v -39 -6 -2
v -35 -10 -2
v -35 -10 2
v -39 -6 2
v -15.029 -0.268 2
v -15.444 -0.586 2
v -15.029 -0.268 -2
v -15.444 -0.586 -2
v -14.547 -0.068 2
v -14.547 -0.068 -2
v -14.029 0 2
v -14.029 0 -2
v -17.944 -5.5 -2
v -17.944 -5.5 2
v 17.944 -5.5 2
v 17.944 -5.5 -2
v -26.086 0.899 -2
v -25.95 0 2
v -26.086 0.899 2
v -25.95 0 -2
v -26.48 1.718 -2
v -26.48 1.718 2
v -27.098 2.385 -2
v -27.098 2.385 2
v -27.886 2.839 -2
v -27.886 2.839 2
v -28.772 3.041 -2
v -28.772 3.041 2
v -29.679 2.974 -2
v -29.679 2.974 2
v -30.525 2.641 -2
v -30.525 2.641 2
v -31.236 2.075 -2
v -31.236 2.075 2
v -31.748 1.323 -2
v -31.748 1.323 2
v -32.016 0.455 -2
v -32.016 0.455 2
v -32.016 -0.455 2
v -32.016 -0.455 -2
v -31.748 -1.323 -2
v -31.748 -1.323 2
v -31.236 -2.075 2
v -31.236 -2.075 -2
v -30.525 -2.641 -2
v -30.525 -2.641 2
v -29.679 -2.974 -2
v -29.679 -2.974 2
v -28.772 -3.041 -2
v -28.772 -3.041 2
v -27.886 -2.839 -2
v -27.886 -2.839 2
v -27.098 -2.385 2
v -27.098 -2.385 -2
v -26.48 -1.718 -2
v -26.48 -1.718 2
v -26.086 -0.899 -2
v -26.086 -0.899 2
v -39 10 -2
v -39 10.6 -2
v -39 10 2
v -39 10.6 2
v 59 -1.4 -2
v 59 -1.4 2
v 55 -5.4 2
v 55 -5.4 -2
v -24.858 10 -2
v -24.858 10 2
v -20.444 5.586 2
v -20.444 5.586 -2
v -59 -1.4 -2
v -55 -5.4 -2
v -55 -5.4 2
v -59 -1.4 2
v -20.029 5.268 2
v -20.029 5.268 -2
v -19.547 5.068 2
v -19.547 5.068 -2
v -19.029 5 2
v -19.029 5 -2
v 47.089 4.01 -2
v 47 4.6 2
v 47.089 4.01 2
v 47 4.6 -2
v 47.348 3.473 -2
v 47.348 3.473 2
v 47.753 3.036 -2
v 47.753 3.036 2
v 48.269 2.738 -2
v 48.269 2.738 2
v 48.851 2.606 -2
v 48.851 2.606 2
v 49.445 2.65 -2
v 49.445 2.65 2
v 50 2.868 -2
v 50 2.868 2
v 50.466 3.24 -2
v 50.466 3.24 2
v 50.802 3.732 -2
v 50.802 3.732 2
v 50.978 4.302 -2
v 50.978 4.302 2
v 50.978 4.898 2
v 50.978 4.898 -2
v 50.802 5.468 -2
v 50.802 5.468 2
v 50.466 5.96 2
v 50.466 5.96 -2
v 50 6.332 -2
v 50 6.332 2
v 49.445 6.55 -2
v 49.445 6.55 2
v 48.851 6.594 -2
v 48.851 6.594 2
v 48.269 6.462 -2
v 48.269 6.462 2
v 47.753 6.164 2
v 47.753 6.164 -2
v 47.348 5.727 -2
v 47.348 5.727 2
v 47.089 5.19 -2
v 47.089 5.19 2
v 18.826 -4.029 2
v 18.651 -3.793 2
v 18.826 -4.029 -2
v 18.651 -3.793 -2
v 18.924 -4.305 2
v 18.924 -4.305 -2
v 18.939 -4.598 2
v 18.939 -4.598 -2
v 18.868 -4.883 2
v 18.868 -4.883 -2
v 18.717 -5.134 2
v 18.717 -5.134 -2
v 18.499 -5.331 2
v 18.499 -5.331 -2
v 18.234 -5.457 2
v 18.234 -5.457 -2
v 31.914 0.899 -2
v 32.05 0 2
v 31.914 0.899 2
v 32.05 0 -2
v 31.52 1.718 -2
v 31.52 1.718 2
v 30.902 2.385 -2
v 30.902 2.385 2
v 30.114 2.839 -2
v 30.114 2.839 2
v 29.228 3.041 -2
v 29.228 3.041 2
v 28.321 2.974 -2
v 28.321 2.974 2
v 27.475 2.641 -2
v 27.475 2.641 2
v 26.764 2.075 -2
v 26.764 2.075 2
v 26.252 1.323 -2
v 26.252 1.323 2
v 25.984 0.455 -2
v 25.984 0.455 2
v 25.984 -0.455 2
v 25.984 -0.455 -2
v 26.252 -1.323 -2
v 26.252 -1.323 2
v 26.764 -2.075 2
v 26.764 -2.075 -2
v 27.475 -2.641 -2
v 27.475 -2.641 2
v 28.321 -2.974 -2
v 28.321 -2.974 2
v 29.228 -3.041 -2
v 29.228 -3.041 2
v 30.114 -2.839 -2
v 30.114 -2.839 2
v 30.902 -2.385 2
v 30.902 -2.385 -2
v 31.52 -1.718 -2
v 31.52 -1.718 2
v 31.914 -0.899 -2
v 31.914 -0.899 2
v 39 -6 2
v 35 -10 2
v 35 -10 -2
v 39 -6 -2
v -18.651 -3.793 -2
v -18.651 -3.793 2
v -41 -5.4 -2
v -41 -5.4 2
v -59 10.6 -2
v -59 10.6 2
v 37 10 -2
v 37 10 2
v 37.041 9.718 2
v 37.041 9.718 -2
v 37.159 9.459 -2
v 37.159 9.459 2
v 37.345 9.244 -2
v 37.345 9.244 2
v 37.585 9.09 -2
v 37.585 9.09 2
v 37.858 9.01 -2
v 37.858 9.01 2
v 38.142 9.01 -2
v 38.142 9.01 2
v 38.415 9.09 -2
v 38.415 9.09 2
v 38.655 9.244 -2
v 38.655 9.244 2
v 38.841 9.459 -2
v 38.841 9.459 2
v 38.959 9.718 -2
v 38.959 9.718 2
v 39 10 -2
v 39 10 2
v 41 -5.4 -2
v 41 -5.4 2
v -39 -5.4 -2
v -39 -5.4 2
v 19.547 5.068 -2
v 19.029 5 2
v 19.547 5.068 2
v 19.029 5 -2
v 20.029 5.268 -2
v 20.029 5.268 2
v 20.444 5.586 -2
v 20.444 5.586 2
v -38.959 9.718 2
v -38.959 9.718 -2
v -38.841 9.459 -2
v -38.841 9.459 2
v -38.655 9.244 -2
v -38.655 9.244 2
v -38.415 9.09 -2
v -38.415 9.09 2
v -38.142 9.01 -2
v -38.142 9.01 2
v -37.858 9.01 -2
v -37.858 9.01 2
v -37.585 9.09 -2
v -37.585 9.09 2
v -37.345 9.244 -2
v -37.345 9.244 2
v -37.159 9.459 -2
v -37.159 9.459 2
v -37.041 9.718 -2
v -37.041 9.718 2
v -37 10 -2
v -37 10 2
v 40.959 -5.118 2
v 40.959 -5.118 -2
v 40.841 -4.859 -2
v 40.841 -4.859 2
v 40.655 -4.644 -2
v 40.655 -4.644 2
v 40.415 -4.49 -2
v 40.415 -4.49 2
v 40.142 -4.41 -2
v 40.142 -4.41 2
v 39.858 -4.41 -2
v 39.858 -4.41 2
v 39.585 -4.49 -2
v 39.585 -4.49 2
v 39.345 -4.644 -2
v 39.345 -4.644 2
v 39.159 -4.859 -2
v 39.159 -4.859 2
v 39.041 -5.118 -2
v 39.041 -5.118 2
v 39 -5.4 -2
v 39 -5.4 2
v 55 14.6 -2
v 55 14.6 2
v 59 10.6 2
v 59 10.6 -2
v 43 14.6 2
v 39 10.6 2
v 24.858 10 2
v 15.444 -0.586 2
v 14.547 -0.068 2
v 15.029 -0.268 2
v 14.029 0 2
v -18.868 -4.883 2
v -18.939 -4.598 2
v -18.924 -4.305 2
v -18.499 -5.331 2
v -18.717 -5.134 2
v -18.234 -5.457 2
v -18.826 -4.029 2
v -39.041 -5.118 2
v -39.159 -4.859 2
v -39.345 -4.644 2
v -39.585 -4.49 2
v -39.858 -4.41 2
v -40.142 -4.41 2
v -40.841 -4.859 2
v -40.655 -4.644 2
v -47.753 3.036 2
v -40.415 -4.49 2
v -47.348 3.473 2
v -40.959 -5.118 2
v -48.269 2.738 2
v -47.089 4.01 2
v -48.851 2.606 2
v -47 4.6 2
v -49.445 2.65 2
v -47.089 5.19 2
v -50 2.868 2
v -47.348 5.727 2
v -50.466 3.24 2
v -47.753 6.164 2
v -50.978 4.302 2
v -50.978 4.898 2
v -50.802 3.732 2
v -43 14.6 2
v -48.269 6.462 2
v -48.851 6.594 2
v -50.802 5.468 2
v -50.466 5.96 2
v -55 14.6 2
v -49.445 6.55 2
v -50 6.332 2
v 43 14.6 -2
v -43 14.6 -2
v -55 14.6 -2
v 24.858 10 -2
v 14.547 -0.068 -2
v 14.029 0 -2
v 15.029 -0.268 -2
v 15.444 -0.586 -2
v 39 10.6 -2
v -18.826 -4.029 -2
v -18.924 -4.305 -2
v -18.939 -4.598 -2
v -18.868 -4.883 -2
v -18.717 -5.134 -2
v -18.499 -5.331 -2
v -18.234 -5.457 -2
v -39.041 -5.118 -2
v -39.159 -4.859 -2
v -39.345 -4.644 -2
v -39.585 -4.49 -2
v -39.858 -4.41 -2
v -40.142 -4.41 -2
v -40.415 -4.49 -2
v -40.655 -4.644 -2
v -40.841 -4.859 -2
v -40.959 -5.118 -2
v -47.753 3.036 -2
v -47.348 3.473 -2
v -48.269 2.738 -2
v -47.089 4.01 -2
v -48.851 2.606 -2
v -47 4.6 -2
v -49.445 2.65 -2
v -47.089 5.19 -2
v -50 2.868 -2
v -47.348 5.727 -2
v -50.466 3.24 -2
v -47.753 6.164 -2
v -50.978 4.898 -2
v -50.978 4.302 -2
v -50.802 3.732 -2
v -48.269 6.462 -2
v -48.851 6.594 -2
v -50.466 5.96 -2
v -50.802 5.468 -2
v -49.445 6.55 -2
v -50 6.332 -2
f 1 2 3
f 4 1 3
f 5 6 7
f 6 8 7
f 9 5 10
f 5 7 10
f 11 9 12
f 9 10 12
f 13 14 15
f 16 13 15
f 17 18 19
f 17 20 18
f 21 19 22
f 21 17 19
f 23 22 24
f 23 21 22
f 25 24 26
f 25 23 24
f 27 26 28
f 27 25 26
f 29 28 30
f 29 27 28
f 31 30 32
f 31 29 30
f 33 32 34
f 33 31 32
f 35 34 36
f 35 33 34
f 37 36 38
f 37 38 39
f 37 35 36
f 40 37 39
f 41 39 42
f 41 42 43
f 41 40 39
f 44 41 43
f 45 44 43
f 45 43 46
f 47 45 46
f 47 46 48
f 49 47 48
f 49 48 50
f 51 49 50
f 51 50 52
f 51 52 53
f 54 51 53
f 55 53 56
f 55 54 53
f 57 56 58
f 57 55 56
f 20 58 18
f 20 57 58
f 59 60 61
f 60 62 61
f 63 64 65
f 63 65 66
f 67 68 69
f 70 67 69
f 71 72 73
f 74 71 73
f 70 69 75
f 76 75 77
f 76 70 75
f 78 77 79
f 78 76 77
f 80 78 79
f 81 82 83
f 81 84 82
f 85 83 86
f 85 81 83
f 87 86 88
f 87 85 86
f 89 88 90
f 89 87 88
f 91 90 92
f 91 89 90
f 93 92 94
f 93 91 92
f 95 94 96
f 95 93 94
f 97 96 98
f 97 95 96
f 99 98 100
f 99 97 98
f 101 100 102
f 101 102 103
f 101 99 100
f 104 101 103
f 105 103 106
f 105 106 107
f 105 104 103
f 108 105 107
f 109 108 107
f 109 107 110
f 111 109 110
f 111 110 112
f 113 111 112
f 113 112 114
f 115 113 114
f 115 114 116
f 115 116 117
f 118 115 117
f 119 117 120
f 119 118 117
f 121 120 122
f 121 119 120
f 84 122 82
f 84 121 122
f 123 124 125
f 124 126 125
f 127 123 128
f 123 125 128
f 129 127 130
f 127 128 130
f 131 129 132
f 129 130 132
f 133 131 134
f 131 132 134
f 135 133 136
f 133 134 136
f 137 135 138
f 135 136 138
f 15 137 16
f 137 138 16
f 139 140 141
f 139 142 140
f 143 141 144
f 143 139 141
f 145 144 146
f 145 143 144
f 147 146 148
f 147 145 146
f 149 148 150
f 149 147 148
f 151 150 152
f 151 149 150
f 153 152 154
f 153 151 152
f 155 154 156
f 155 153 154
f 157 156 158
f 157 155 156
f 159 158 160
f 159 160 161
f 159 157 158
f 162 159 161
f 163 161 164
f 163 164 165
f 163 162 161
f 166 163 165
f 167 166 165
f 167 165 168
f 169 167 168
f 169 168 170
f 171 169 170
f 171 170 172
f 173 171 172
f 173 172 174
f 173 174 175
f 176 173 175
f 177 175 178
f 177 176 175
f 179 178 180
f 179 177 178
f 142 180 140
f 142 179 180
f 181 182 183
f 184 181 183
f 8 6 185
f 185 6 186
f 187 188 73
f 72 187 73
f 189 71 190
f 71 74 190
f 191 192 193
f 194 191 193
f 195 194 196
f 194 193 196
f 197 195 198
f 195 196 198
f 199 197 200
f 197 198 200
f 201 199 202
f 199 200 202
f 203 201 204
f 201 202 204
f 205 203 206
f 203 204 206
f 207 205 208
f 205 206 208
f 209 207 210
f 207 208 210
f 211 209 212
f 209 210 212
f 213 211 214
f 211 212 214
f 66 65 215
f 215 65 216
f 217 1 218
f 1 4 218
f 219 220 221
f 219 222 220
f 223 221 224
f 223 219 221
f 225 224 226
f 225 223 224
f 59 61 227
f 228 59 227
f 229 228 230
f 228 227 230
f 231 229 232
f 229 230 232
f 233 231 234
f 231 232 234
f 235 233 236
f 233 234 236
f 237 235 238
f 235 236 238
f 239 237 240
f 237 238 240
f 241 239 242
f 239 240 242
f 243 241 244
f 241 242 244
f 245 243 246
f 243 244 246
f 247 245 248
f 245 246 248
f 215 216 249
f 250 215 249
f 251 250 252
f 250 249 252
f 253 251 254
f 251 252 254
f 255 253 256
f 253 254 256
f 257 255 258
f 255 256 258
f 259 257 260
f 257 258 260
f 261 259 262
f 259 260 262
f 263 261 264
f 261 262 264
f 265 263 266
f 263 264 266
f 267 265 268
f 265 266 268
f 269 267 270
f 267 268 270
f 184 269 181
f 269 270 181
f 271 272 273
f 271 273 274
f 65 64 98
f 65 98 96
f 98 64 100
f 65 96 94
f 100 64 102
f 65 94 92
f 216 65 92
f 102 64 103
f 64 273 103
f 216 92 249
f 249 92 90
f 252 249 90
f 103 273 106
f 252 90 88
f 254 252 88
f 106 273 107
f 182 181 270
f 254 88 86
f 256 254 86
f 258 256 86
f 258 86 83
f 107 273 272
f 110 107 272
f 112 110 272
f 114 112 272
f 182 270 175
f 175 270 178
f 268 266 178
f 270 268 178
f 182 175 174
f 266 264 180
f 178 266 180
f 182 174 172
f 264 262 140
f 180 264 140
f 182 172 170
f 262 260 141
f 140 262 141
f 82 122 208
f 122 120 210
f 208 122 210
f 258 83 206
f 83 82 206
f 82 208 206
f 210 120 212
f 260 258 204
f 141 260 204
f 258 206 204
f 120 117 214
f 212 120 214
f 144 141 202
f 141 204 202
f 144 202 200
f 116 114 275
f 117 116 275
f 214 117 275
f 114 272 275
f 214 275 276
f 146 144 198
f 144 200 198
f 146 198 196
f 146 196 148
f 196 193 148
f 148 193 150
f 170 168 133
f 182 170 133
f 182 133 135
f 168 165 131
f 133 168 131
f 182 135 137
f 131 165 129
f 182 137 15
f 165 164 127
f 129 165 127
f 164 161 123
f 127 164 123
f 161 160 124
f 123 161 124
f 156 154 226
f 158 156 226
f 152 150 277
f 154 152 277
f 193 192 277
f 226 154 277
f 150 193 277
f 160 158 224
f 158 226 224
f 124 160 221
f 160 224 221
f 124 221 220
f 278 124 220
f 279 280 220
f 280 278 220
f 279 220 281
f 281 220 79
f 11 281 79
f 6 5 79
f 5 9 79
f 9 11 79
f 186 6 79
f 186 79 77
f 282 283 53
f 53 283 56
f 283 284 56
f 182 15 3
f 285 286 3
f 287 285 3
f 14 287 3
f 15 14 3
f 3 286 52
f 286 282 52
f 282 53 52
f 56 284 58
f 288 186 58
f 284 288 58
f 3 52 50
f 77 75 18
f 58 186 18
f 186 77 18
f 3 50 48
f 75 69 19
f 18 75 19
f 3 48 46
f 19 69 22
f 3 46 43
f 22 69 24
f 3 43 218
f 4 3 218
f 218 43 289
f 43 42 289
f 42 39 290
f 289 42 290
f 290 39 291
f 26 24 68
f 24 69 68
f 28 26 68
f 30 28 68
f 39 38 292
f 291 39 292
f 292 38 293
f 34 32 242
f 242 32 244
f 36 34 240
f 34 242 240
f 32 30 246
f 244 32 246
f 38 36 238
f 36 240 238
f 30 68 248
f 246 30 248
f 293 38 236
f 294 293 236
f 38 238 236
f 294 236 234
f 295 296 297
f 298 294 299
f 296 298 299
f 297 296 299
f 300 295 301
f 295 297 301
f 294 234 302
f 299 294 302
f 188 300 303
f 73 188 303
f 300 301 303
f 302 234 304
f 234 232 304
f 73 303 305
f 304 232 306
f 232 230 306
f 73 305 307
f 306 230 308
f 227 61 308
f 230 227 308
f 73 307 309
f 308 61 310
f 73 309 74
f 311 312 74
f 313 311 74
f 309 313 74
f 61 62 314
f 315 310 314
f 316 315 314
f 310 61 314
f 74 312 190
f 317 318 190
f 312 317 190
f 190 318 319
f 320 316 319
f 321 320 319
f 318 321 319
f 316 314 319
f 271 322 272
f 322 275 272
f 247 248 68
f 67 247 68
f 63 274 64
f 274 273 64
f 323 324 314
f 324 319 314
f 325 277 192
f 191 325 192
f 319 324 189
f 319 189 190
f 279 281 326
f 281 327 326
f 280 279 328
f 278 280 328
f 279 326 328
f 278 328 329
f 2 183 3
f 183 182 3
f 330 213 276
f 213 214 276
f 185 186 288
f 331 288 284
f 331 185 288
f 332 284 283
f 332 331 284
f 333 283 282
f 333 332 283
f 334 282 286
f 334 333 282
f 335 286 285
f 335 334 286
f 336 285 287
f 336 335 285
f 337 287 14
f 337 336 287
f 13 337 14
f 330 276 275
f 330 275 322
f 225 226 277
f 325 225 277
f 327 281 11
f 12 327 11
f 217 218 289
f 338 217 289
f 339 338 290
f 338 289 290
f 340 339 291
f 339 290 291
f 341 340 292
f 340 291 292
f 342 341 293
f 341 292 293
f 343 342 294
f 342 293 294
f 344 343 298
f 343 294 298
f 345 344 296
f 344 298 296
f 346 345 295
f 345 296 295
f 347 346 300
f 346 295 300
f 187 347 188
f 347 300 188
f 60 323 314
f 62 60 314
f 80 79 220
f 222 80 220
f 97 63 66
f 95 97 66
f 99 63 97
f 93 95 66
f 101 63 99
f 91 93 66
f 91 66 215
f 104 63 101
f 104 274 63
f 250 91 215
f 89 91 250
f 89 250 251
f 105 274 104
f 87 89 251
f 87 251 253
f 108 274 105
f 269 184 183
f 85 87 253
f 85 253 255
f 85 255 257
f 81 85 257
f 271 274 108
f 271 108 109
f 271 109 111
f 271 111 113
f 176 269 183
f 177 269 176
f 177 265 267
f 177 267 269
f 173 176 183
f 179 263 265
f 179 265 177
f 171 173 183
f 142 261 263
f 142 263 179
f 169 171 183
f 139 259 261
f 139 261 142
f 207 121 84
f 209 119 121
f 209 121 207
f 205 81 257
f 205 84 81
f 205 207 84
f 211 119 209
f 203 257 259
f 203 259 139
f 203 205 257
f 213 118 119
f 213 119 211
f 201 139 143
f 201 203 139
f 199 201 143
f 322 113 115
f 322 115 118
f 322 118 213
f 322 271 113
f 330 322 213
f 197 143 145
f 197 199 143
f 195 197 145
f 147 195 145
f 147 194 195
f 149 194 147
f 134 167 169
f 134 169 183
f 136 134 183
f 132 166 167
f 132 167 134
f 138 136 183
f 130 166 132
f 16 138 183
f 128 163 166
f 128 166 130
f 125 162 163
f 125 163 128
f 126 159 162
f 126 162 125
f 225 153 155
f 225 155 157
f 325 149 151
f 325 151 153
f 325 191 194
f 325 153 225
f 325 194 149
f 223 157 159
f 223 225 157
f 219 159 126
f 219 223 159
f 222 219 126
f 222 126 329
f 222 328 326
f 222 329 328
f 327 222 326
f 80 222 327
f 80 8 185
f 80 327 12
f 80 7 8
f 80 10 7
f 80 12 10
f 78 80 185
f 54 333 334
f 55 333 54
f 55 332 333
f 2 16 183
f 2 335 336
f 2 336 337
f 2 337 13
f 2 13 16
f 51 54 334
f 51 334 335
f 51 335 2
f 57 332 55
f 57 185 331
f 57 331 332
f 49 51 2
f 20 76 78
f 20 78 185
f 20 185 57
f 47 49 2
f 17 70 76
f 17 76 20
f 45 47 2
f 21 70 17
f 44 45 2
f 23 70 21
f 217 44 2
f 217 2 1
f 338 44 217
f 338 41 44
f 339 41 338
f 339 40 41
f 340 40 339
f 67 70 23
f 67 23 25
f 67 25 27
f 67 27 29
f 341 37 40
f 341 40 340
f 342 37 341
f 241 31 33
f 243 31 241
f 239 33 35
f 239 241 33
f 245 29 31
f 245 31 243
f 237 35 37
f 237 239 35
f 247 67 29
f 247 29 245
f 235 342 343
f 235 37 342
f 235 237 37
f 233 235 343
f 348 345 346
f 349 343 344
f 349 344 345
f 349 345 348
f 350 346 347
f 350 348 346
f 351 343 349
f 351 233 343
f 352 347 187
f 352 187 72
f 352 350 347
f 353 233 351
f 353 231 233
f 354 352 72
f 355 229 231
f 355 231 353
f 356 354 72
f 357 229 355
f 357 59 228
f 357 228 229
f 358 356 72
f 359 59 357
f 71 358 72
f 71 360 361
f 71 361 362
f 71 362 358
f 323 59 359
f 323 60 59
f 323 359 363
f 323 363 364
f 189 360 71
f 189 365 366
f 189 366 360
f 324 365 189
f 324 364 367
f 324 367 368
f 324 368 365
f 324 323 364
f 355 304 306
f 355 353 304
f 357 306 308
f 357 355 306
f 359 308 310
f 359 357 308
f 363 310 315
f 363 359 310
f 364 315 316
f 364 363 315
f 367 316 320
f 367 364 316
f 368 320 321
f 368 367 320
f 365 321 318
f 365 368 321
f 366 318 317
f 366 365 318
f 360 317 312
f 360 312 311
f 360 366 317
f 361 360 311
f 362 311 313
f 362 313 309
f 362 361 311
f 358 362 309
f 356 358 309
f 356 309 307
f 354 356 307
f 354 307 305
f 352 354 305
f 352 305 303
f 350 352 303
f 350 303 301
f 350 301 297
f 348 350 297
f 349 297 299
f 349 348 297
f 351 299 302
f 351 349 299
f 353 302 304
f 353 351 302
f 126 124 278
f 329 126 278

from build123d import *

# Parameters (mm, degrees)
SKETCH_1_R          = 3.05
SKETCH_1_R_2        = 2
EXTRUDE_1_DEPTH     = 2
SKETCH_2_R          = 1
CUT_EXTRUDE_1_DEPTH = 61.911082735
CHAMFER_1_SIZE      = 4
CUT_EXTRUDE_2_DEPTH = 61.911082735
FILLET_1_R          = 1
FILLET_2_R          = 2


with BuildPart() as part:
    # 草图1 → 凸台-拉伸1 (new, symmetric)
    with BuildSketch(Plane.XY):
        Polygon((-39, 10), (39, 10), (39, 14.6), (59, 14.6), (59, -5.4), (39, -5.4), (39, -10), (-39, -10), (-39, -5.4), (-59, -5.4), (-59, 14.6), (-39, 14.6), align=None)
        with Locations((-29, 0)):
            Circle(SKETCH_1_R, mode=Mode.SUBTRACT)
        with Locations((29, 0)):
            Circle(SKETCH_1_R, mode=Mode.SUBTRACT)
        with Locations((-49, 4.6)):
            Circle(SKETCH_1_R_2, mode=Mode.SUBTRACT)
        with Locations(Location((49, 4.6, 0), (0, 0, 180))):
            Circle(SKETCH_1_R_2, mode=Mode.SUBTRACT)
    extrude(amount=EXTRUDE_1_DEPTH, both=True)

    # 草图2 → 切除-拉伸1 (cut, through all)
    with BuildSketch(Plane.XY.offset(2)):
        with Locations((-38, 10)):
            Circle(SKETCH_2_R)
        with Locations((-40, -5.4)):
            Circle(SKETCH_2_R)
        with Locations((38, 10)):
            Circle(SKETCH_2_R)
        with Locations((40, -5.4)):
            Circle(SKETCH_2_R)
        Polygon((-24.857864376, 10), (-19.857864376, 5), (19.857864376, 5), (24.857864376, 10), align=None)
    extrude(amount=-CUT_EXTRUDE_1_DEPTH, mode=Mode.SUBTRACT)

    # 倒角1
    chamfer_1_edges = [part.edges().sort_by_distance(p)[0] for p in [
        (39, 14.6, 0),
        (59, 14.6, 0),
        (59, -5.4, 0),
        (39, -10, 0),
        (-39, -10, 0),
        (-59, -5.4, 0),
        (-59, 14.6, 0),
        (-39, 14.6, 0),
    ]]
    chamfer(chamfer_1_edges, length=CHAMFER_1_SIZE)

    # 草图3 → 切除-拉伸2 (cut, through all)
    with BuildSketch(Plane.XY.offset(2)):
        Polygon((-14.857864376, 0), (-20.357864376, -5.5), (20.357864376, -5.5), (14.857864376, 0), align=None)
    extrude(amount=-CUT_EXTRUDE_2_DEPTH, mode=Mode.SUBTRACT)

    # 圆角1
    fillet_1_edges = [part.edges().sort_by_distance(p)[0] for p in [
        (20.357864376, -5.5, 0),
        (-20.357864376, -5.5, 0),
    ]]
    fillet(fillet_1_edges, radius=FILLET_1_R)

    # 圆角2
    fillet_2_edges = [part.edges().sort_by_distance(p)[0] for p in [
        (-14.857864376, 0, 0),
        (14.857864376, 0, 0),
        (19.857864376, 5, 0),
        (-19.857864376, 5, 0),
    ]]
    fillet(fillet_2_edges, radius=FILLET_2_R)


solid = part.part
